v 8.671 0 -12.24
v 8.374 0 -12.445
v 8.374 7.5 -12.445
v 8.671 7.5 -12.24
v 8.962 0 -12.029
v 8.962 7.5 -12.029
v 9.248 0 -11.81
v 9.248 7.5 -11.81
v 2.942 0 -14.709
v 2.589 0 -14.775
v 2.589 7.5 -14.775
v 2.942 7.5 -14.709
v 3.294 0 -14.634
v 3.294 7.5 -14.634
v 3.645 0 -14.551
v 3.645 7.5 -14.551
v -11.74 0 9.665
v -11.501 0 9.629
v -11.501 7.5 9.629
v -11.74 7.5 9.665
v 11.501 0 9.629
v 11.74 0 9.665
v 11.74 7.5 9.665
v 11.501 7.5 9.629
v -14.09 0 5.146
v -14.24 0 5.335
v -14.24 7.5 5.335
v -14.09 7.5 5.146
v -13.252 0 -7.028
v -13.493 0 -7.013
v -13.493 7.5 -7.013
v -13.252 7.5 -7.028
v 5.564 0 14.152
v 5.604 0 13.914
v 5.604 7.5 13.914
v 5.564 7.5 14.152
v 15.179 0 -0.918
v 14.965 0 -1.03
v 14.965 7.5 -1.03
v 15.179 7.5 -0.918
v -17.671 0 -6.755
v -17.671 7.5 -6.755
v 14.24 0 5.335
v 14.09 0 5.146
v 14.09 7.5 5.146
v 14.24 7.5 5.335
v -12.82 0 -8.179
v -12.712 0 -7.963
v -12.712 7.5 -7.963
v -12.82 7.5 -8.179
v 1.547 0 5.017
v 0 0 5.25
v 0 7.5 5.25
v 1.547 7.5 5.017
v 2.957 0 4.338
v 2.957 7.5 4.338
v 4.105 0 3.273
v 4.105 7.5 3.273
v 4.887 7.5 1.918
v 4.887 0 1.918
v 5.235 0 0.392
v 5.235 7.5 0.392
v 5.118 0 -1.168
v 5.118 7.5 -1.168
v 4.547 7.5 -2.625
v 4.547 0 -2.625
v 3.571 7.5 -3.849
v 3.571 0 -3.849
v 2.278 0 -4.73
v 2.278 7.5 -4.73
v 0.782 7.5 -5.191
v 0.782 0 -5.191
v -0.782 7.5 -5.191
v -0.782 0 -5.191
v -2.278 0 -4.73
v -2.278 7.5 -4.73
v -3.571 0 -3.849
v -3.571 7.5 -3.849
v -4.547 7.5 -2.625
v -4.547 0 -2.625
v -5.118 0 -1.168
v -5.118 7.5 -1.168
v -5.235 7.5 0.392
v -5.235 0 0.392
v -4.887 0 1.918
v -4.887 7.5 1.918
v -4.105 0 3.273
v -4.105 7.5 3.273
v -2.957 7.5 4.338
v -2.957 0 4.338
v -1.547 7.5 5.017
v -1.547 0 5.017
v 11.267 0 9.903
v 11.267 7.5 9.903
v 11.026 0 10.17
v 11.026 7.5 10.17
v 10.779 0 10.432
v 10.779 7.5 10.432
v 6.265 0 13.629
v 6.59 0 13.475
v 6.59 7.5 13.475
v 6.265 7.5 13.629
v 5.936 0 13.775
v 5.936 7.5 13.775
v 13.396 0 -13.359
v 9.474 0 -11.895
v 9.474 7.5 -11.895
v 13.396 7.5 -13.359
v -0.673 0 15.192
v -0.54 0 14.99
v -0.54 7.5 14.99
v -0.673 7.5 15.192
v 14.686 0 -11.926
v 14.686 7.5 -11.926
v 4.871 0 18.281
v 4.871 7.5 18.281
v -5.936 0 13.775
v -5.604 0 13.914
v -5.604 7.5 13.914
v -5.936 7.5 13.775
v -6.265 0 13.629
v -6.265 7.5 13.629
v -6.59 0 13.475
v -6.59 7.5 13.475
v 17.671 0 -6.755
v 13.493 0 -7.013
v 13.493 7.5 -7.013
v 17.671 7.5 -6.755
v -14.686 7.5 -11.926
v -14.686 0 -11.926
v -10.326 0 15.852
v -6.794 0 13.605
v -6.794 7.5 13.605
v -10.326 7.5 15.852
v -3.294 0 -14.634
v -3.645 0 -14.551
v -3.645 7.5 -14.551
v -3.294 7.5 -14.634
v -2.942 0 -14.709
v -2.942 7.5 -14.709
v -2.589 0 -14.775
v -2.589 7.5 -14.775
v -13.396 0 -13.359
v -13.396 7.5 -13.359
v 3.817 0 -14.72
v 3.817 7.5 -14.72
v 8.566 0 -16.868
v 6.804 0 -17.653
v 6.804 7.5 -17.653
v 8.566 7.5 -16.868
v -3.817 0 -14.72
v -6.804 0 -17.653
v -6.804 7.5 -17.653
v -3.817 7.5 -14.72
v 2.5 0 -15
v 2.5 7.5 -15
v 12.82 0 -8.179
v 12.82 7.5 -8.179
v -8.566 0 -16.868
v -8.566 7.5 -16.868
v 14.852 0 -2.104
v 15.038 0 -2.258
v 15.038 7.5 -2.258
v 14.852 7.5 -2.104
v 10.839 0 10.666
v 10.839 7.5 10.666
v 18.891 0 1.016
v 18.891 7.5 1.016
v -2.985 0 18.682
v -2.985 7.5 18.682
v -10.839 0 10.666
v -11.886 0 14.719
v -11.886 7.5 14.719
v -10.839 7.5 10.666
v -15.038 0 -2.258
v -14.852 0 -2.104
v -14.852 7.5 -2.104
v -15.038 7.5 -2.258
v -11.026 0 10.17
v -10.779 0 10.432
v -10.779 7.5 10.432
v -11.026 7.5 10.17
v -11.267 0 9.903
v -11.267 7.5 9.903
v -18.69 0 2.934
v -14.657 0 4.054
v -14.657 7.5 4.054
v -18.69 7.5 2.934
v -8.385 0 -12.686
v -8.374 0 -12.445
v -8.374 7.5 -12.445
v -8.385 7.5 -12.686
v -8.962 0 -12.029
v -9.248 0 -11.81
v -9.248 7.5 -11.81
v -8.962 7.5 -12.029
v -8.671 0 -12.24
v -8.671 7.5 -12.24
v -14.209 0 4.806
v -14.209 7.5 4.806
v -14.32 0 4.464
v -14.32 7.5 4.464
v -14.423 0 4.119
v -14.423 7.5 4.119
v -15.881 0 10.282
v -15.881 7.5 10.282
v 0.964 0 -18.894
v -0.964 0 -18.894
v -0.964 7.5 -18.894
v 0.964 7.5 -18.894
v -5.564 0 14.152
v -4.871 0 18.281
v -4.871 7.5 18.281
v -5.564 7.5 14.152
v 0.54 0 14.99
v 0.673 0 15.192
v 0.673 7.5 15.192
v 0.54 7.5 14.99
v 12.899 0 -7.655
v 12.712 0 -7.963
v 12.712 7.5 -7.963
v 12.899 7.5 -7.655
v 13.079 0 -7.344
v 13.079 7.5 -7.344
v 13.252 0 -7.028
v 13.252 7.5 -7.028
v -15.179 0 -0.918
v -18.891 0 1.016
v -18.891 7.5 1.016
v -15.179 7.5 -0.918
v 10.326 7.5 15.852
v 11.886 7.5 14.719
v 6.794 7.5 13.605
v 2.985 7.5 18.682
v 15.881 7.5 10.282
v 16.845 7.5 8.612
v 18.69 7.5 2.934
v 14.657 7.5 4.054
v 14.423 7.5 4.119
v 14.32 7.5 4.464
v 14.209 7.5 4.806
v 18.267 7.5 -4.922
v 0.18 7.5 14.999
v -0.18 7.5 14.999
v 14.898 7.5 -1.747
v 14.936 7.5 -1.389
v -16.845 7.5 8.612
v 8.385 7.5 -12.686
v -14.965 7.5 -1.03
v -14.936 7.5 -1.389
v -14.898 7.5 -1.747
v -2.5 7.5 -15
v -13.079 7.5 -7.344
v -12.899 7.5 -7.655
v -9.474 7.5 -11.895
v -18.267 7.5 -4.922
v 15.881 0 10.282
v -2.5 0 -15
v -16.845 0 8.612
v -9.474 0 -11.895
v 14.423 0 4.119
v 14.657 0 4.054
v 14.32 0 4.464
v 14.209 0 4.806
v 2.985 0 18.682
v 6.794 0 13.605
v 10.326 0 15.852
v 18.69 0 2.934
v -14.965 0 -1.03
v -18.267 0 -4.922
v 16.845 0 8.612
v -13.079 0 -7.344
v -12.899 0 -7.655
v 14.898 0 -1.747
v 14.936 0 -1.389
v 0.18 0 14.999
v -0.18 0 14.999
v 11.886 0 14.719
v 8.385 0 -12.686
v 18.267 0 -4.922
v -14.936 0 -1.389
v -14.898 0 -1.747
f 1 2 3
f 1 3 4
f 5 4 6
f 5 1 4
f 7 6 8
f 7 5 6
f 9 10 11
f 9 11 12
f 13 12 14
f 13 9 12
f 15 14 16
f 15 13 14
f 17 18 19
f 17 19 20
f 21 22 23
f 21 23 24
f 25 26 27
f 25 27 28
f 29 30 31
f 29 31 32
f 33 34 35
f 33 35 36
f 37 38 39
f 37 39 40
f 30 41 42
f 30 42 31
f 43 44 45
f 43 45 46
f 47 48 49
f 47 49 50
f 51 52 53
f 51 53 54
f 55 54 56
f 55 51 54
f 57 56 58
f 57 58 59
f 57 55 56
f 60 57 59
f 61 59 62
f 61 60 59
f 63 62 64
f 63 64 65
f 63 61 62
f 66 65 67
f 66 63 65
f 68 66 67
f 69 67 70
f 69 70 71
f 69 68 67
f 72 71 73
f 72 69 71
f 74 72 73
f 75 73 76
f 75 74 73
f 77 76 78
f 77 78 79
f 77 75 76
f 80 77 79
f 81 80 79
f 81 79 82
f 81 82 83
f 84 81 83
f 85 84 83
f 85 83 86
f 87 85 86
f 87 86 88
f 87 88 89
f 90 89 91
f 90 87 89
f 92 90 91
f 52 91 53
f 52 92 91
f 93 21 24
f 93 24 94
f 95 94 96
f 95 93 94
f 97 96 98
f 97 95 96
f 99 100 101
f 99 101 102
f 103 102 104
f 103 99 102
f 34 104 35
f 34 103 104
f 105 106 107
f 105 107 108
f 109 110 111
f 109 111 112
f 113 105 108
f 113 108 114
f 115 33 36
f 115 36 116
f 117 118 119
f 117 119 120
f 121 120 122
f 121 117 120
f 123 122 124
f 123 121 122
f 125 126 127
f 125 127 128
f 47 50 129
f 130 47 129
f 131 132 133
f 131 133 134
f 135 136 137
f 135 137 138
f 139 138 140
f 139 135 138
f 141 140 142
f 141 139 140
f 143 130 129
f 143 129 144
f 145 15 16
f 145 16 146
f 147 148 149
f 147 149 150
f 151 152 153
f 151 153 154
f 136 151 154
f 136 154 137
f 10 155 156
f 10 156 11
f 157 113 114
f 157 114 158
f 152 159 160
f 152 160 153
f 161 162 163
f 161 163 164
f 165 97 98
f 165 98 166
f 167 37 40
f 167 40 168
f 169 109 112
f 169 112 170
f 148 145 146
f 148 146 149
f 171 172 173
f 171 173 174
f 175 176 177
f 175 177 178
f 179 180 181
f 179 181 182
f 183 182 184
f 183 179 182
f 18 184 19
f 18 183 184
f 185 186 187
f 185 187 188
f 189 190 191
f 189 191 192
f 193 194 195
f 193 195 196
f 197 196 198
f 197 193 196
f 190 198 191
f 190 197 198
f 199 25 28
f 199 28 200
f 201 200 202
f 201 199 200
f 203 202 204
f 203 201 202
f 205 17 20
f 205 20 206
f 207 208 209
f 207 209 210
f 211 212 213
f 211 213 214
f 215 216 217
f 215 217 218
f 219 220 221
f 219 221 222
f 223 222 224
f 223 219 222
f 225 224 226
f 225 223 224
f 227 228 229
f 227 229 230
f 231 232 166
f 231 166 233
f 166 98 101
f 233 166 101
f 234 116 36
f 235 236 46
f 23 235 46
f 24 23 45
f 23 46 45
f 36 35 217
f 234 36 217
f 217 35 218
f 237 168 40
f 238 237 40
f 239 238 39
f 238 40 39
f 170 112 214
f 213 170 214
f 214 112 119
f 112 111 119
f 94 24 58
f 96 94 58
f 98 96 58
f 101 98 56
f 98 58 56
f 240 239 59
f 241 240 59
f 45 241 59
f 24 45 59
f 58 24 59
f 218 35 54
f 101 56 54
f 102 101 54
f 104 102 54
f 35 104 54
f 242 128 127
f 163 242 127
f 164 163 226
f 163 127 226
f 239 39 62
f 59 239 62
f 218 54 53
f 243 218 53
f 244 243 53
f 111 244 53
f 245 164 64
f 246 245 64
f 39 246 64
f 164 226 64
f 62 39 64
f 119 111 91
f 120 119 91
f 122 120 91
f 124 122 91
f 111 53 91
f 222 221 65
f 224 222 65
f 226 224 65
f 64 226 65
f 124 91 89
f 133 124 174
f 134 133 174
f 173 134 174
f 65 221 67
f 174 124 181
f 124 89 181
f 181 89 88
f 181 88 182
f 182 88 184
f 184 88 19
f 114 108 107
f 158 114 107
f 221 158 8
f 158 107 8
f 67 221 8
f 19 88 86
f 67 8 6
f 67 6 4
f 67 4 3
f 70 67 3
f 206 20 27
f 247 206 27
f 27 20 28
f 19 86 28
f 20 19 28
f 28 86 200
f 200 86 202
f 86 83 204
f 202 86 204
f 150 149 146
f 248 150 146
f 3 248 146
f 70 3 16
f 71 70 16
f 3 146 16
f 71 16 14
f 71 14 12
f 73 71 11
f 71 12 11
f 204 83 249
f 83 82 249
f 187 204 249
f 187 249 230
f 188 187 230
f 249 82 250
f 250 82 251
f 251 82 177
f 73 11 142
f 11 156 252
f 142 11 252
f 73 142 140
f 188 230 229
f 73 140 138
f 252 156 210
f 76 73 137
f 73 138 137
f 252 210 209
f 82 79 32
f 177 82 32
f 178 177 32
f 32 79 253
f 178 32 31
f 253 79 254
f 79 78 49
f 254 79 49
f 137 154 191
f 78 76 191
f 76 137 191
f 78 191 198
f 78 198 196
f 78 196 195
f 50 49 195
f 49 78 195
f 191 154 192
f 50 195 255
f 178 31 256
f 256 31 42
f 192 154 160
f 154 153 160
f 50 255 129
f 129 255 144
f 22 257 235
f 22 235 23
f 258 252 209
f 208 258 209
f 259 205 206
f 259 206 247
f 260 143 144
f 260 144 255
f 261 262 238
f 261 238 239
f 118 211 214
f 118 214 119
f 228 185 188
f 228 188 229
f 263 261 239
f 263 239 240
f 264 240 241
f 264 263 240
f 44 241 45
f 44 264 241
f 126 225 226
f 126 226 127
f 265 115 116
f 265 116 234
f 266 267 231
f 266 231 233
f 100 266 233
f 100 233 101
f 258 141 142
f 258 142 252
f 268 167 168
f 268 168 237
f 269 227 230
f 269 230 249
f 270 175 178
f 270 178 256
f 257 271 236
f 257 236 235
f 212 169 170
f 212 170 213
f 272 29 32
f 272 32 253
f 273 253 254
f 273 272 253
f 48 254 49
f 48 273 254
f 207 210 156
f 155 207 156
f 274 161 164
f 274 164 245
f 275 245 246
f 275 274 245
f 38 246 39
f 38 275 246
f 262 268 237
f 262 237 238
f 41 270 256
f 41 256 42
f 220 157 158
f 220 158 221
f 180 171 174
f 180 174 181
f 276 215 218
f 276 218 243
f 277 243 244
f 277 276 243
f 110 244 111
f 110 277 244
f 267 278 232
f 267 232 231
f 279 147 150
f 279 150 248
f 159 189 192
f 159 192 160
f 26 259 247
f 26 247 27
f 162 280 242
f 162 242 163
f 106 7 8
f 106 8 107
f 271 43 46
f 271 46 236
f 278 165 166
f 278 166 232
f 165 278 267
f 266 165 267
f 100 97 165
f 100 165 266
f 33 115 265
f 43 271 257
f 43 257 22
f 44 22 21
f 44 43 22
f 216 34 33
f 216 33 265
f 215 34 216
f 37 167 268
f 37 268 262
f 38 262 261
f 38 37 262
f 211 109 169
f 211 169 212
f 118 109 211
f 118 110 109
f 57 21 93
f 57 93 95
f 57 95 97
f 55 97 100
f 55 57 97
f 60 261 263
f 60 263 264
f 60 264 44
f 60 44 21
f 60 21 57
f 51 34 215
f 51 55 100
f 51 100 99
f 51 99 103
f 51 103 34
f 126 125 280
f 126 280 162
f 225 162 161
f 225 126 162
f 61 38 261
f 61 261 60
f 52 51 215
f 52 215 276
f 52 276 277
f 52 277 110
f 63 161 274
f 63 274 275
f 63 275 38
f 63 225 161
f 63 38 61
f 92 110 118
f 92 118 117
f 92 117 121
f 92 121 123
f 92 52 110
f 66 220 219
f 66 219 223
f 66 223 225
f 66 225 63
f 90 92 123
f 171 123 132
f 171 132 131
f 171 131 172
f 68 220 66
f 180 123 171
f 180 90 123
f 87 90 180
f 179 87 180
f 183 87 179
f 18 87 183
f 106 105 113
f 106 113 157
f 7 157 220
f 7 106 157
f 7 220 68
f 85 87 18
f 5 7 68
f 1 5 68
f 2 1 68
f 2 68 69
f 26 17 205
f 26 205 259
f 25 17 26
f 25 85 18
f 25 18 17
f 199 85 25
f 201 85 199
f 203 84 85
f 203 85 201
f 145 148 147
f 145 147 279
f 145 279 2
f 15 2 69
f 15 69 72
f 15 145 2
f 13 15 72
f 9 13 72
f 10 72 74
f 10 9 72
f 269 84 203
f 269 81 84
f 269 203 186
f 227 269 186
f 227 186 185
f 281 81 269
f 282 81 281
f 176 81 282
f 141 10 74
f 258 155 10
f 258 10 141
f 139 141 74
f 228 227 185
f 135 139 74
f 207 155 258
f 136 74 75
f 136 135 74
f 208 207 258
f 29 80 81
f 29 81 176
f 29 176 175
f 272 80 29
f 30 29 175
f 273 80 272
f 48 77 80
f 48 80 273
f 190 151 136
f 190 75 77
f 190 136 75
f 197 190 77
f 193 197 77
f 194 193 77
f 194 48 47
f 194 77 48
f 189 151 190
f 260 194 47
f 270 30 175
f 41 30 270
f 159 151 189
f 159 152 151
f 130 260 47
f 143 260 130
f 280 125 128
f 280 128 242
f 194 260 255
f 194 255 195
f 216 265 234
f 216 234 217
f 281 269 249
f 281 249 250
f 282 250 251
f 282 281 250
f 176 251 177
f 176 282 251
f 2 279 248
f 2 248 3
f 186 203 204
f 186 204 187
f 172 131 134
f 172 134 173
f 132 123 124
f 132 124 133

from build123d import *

# Parameters (mm, degrees)
CROQUIS1_R              = 5.25
SALIENTE_EXTRUIR1_DEPTH = 7.5


with BuildPart() as part:
    # Croquis1 → Saliente-Extruir1 (new body)
    with BuildSketch(Plane(origin=(0, 0, 0), x_dir=(1, 0, 0), z_dir=(0, 1, 0))):
        with BuildLine():
            Line((-2.5, 15), (-0.96403744, 18.894029408))
            Line((-0.96403744, 18.894029408), (0.96403744, 18.894029408))
            Line((0.96403744, 18.894029408), (2.5, 15))
            Line((2.5, 15), (2.588781311, 14.774918319))
            ThreePointArc((2.588781311, 14.774918319), (3.118675362, 14.672214011), (3.644531271, 14.550511737))
            Line((3.644531271, 14.550511737), (3.817186002, 14.720023472))
            Line((3.817186002, 14.720023472), (6.804202071, 17.652664095))
            Line((6.804202071, 17.652664095), (8.56558612, 16.86844539))
            Line((8.56558612, 16.86844539), (8.38491329, 12.686340257))
            Line((8.38491329, 12.686340257), (8.374470086, 12.444607297))
            ThreePointArc((8.374470086, 12.444607297), (8.816778784, 12.135254916), (9.247671287, 11.810189489))
            Line((9.247671287, 11.810189489), (9.474345866, 11.894821159))
            Line((9.474345866, 11.894821159), (13.39593323, 13.35899279))
            Line((13.39593323, 13.35899279), (14.686067144, 11.926153919))
            Line((14.686067144, 11.926153919), (12.819998898, 8.179097032))
            Line((12.819998898, 8.179097032), (12.712136904, 7.962510618))
            ThreePointArc((12.712136904, 7.962510618), (12.990381057, 7.5), (13.251804925, 7.027778186))
            Line((13.251804925, 7.027778186), (13.493305258, 7.012896206))
            Line((13.493305258, 7.012896206), (17.671385836, 6.755430269))
            Line((17.671385836, 6.755430269), (18.26719374, 4.92172209))
            Line((18.26719374, 4.92172209), (15.03839023, 2.257613625))
            Line((15.03839023, 2.257613625), (14.851759765, 2.103623516))
            ThreePointArc((14.851759765, 2.103623516), (14.917828431, 1.567926949), (14.964581102, 1.030200189))
            Line((14.964581102, 1.030200189), (15.179149589, 0.918377789))
            Line((15.179149589, 0.918377789), (18.891295291, -1.016207517))
            Line((18.891295291, -1.016207517), (18.689756586, -2.933720201))
            Line((18.689756586, -2.933720201), (14.656507272, -4.054231687))
            Line((14.656507272, -4.054231687), (14.423378438, -4.118999203))
            ThreePointArc((14.423378438, -4.118999203), (14.265847744, -4.635254916), (14.089845258, -5.145508779))
            Line((14.089845258, -5.145508779), (14.240381057, -5.334936491))
            Line((14.240381057, -5.334936491), (16.844728168, -8.612133791))
            Line((16.844728168, -8.612133791), (15.880690727, -10.281895618))
            Line((15.880690727, -10.281895618), (11.740381057, -9.665063509))
            Line((11.740381057, -9.665063509), (11.501063947, -9.629409539))
            ThreePointArc((11.501063947, -9.629409539), (11.147172382, -10.036959095), (10.778847167, -10.431512534))
            Line((10.778847167, -10.431512534), (10.83932127, -10.665791785))
            Line((10.83932127, -10.665791785), (11.885554515, -14.718943894))
            Line((11.885554515, -14.718943894), (10.32570917, -15.852237874))
            Line((10.32570917, -15.852237874), (6.794236298, -13.604718046))
            Line((6.794236298, -13.604718046), (6.590111016, -13.474807486))
            ThreePointArc((6.590111016, -13.474807486), (6.101049646, -13.703181865), (5.604088477, -13.913813005))
            Line((5.604088477, -13.913813005), (5.564044364, -14.152434784))
            Line((5.564044364, -14.152434784), (4.87126051, -18.28071488))
            Line((4.87126051, -18.28071488), (2.985318691, -18.681584188))
            Line((2.985318691, -18.681584188), (0.67330636, -15.191993238))
            Line((0.67330636, -15.191993238), (0.539668021, -14.990288804))
            ThreePointArc((0.539668021, -14.990288804), (0, -15), (-0.539668021, -14.990288804))
            Line((-0.539668021, -14.990288804), (-0.67330636, -15.191993238))
            Line((-0.67330636, -15.191993238), (-2.985318691, -18.681584188))
            Line((-2.985318691, -18.681584188), (-4.87126051, -18.28071488))
            Line((-4.87126051, -18.28071488), (-5.564044364, -14.152434784))
            Line((-5.564044364, -14.152434784), (-5.604088477, -13.913813005))
            ThreePointArc((-5.604088477, -13.913813005), (-6.101049646, -13.703181865), (-6.590111016, -13.474807486))
            Line((-6.590111016, -13.474807486), (-6.794236298, -13.604718046))
            Line((-6.794236298, -13.604718046), (-10.32570917, -15.852237874))
            Line((-10.32570917, -15.852237874), (-11.885554515, -14.718943894))
            Line((-11.885554515, -14.718943894), (-10.83932127, -10.665791785))
            Line((-10.83932127, -10.665791785), (-10.778847167, -10.431512534))
            ThreePointArc((-10.778847167, -10.431512534), (-11.147172382, -10.036959095), (-11.501063947, -9.629409539))
            Line((-11.501063947, -9.629409539), (-11.740381057, -9.665063509))
            Line((-11.740381057, -9.665063509), (-15.880690727, -10.281895618))
            Line((-15.880690727, -10.281895618), (-16.844728168, -8.612133791))
            Line((-16.844728168, -8.612133791), (-14.240381057, -5.334936491))
            Line((-14.240381057, -5.334936491), (-14.089845258, -5.145508779))
            ThreePointArc((-14.089845258, -5.145508779), (-14.265847744, -4.635254916), (-14.423378438, -4.118999203))
            Line((-14.423378438, -4.118999203), (-14.656507272, -4.054231687))
            Line((-14.656507272, -4.054231687), (-18.689756586, -2.933720201))
            Line((-18.689756586, -2.933720201), (-18.891295291, -1.016207517))
            Line((-18.891295291, -1.016207517), (-15.179149589, 0.918377789))
            Line((-15.179149589, 0.918377789), (-14.964581102, 1.030200189))
            ThreePointArc((-14.964581102, 1.030200189), (-14.917828431, 1.567926949), (-14.851759765, 2.103623516))
            Line((-14.851759765, 2.103623516), (-15.03839023, 2.257613625))
            Line((-15.03839023, 2.257613625), (-18.26719374, 4.92172209))
            Line((-18.26719374, 4.92172209), (-17.671385836, 6.755430269))
            Line((-17.671385836, 6.755430269), (-13.493305258, 7.012896206))
            Line((-13.493305258, 7.012896206), (-13.251804925, 7.027778186))
            ThreePointArc((-13.251804925, 7.027778186), (-12.990381057, 7.5), (-12.712136904, 7.962510618))
            Line((-12.712136904, 7.962510618), (-12.819998898, 8.179097032))
            Line((-12.819998898, 8.179097032), (-14.686067144, 11.926153919))
            Line((-14.686067144, 11.926153919), (-13.39593323, 13.35899279))
            Line((-13.39593323, 13.35899279), (-9.474345866, 11.894821159))
            Line((-9.474345866, 11.894821159), (-9.247671287, 11.810189489))
            ThreePointArc((-9.247671287, 11.810189489), (-8.816778784, 12.135254916), (-8.374470086, 12.444607297))
            Line((-8.374470086, 12.444607297), (-8.38491329, 12.686340257))
            Line((-8.38491329, 12.686340257), (-8.56558612, 16.86844539))
            Line((-8.56558612, 16.86844539), (-6.804202071, 17.652664095))
            Line((-6.804202071, 17.652664095), (-3.817186002, 14.720023472))
            Line((-3.817186002, 14.720023472), (-3.644531271, 14.550511737))
            ThreePointArc((-3.644531271, 14.550511737), (-3.118675362, 14.672214011), (-2.588781311, 14.774918319))
            Line((-2.588781311, 14.774918319), (-2.5, 15))
        make_face()
        with Locations(Location((0, 0, 0), (0, 0, 270))):
            Circle(CROQUIS1_R, mode=Mode.SUBTRACT)
    extrude(amount=SALIENTE_EXTRUIR1_DEPTH)


solid = part.part
